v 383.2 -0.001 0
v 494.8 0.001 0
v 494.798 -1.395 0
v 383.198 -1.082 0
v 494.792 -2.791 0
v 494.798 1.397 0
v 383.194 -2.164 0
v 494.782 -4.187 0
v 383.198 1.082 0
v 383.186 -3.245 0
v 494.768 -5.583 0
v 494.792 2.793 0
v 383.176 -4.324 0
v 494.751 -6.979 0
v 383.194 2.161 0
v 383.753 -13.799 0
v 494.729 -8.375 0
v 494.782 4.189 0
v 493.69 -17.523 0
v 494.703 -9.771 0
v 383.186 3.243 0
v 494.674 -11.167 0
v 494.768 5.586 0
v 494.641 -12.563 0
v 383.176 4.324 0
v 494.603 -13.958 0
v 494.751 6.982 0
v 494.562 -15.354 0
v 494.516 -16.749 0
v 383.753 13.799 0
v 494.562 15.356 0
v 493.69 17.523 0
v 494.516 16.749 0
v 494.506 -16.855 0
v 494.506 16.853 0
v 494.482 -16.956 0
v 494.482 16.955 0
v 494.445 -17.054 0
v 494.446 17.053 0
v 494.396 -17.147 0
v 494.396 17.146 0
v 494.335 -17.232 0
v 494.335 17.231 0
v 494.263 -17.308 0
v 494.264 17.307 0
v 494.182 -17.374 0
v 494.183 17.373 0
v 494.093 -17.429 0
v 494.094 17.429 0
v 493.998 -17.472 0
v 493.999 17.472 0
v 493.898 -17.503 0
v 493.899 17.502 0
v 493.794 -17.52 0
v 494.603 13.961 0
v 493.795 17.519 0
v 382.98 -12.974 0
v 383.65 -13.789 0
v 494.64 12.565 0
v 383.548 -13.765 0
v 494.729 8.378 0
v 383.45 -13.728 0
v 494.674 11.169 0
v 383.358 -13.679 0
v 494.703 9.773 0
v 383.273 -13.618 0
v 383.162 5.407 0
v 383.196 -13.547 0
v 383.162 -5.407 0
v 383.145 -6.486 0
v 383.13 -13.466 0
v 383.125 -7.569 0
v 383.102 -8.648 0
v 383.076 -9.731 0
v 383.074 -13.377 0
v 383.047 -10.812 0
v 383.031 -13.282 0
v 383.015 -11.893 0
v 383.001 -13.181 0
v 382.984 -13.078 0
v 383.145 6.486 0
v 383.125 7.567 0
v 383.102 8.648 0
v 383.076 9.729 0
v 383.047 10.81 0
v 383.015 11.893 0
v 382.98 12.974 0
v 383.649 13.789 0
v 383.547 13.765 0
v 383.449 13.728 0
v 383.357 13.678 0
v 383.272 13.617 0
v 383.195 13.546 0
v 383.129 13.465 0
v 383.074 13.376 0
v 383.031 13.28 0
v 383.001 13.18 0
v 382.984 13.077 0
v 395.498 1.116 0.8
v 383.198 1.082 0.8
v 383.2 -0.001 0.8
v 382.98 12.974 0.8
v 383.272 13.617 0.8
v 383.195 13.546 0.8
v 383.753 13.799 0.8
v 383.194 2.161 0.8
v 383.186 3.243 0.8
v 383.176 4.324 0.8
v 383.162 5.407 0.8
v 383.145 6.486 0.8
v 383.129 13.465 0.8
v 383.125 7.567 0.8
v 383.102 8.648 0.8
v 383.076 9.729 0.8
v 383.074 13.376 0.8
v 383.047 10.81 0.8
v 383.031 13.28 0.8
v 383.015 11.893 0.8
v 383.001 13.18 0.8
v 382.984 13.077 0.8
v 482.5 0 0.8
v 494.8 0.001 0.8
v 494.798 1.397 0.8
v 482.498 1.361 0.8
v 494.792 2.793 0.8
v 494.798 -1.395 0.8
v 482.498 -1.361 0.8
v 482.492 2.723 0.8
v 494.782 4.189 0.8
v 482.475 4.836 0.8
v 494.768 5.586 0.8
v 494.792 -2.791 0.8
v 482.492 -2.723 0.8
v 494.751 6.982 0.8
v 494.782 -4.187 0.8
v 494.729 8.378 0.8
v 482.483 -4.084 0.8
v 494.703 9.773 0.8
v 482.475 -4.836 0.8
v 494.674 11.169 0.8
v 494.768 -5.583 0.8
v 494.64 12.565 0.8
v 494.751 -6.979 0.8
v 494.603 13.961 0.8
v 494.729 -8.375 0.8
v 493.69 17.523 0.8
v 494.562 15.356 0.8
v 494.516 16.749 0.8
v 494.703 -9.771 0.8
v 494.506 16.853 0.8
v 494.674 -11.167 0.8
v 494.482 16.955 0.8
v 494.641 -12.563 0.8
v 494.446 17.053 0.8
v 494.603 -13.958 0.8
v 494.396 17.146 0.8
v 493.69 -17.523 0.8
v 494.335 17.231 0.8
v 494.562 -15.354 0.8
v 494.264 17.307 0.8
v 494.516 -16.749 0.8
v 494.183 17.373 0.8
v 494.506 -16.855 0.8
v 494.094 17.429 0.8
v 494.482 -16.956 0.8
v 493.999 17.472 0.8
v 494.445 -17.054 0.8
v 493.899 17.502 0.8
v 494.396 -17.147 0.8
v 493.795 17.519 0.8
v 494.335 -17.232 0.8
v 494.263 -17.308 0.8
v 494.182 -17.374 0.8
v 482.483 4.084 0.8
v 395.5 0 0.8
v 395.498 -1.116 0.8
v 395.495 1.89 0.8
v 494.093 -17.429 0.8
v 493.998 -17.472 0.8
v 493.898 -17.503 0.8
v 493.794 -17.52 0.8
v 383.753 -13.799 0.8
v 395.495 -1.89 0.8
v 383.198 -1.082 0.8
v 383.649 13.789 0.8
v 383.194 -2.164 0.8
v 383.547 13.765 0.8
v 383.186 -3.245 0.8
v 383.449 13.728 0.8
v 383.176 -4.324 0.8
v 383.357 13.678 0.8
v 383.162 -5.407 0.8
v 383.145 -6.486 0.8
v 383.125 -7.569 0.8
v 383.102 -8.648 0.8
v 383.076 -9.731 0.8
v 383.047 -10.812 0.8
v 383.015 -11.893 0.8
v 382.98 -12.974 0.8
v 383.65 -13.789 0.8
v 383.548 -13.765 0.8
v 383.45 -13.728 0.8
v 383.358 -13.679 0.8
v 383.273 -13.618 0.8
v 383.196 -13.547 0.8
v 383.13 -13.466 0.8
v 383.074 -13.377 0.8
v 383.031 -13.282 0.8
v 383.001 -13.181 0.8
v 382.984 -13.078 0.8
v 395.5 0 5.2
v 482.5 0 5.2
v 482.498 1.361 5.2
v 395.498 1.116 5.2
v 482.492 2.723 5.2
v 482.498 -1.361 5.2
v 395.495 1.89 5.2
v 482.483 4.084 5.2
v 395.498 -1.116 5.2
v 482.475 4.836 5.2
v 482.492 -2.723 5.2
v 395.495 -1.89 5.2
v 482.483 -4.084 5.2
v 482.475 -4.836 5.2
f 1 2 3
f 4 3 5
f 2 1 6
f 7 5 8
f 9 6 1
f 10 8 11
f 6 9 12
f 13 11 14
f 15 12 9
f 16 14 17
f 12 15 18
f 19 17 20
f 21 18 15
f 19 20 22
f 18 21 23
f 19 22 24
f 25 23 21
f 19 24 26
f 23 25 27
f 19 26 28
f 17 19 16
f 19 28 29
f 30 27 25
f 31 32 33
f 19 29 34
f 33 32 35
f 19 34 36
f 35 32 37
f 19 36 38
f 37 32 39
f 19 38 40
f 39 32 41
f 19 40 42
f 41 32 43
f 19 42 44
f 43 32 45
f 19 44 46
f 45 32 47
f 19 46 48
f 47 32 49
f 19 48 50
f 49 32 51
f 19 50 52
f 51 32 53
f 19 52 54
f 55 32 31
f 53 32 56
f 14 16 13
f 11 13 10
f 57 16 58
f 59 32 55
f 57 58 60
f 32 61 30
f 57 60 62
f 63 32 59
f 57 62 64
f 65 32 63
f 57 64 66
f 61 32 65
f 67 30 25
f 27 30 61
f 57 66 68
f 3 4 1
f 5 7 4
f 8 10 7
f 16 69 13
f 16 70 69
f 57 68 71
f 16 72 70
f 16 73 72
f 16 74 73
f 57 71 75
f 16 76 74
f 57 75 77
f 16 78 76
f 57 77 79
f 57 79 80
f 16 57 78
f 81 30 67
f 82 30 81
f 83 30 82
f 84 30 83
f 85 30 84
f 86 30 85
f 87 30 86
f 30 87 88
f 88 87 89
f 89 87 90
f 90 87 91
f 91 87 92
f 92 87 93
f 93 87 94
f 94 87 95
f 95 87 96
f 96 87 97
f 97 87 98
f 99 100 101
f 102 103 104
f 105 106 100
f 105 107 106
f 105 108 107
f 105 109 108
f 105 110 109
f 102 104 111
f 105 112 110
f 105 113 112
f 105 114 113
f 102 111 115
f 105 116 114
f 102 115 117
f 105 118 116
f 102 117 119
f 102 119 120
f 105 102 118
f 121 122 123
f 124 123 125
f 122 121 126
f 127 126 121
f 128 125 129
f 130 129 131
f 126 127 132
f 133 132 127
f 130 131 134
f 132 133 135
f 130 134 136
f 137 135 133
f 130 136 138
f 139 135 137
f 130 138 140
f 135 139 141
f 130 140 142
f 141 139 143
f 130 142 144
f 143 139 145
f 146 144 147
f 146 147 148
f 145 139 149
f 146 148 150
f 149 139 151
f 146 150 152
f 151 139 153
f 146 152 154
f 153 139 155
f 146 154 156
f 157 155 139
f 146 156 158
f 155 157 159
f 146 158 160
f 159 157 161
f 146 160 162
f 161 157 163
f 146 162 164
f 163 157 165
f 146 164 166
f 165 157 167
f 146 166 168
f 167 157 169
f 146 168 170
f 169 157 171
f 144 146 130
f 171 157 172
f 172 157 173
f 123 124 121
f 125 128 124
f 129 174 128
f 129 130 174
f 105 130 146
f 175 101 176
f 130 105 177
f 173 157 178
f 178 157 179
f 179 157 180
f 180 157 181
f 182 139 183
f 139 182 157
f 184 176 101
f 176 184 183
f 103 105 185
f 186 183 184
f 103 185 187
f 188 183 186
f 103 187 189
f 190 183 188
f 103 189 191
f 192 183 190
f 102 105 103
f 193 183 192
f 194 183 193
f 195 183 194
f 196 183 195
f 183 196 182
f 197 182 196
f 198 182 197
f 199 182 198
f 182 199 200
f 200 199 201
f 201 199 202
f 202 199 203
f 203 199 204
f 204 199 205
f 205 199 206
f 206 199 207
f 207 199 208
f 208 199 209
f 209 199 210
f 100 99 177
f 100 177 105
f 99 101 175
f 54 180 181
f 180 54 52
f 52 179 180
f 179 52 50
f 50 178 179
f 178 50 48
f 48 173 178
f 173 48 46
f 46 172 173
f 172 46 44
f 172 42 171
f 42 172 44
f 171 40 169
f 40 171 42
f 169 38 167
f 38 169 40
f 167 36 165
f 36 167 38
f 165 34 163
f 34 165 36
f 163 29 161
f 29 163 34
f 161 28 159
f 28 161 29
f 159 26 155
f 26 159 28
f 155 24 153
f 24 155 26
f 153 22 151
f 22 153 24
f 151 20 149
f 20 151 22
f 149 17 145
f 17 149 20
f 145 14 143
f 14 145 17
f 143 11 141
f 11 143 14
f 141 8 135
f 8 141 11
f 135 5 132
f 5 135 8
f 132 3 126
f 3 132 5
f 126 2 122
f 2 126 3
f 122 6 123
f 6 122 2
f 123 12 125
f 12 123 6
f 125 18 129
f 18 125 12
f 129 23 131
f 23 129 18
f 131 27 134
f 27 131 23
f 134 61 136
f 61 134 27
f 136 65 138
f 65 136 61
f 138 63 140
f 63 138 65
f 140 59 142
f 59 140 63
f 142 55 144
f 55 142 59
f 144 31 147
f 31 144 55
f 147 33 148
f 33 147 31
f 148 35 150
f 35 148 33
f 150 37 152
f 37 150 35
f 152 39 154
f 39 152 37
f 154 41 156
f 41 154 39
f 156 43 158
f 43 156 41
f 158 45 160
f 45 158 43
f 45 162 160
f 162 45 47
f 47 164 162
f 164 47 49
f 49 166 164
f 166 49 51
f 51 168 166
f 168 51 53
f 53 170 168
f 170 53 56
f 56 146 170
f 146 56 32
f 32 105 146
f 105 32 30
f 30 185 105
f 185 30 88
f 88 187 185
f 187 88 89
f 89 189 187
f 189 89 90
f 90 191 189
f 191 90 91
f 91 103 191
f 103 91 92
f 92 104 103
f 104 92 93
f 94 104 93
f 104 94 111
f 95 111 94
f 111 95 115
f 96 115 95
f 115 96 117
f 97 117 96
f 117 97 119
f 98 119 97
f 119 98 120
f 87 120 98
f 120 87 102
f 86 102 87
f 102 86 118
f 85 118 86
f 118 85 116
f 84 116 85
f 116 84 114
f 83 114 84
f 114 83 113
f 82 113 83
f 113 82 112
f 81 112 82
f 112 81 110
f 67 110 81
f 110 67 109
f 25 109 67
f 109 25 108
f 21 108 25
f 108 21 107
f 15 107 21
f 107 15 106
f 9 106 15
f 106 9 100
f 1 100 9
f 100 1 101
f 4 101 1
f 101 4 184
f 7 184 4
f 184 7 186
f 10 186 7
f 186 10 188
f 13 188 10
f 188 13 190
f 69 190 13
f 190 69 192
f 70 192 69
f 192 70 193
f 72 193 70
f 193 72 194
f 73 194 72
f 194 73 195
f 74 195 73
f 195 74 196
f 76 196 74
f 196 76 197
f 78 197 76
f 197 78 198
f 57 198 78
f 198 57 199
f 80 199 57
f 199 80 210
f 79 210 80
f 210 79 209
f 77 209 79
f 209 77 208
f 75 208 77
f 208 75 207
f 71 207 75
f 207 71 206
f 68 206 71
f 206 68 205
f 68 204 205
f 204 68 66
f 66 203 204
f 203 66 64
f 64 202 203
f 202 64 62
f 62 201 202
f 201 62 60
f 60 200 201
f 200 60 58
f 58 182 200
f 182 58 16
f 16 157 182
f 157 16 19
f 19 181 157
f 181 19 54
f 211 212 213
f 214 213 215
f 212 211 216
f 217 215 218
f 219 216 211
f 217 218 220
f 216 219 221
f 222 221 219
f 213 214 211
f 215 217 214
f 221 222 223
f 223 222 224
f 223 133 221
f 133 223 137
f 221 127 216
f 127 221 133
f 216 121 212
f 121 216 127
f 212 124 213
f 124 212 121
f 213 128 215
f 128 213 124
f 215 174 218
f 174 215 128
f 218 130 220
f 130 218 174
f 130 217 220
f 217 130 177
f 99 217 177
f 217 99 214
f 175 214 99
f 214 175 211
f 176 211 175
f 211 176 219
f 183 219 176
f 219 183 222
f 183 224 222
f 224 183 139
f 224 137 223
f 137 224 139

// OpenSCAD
// Gen-EE — bobbin BASE (bottom flange + hub). Print x12, flange down. Wind 24 AWG x 138 t around
// the hub with the LID glued on (coil_lid.stl). Copper lives ONLY between the flanges (no proud winds).
include <parameters.scad>;
$fn = 48;
module sector_2d(r_in, r_out, ang) {
    polygon([
        for (a = [-ang/2 : ang/24 : ang/2]) [r_in*cos(a), r_in*sin(a)],
        for (a = [ang/2 : -ang/24 : -ang/2]) [r_out*cos(a), r_out*sin(a)]
    ]);
}
module footprint_2d() { offset(r=wall) sector_2d(coil_id_r, coil_od_r, span_deg); }
module hub_2d()       { offset(delta=-coil_core_inset) sector_2d(coil_id_r, coil_od_r, span_deg); }

union() {
    linear_extrude(flange_t) footprint_2d();
    translate([0, 0, flange_t - 0.01]) linear_extrude(former_web + 0.01) hub_2d();
}
